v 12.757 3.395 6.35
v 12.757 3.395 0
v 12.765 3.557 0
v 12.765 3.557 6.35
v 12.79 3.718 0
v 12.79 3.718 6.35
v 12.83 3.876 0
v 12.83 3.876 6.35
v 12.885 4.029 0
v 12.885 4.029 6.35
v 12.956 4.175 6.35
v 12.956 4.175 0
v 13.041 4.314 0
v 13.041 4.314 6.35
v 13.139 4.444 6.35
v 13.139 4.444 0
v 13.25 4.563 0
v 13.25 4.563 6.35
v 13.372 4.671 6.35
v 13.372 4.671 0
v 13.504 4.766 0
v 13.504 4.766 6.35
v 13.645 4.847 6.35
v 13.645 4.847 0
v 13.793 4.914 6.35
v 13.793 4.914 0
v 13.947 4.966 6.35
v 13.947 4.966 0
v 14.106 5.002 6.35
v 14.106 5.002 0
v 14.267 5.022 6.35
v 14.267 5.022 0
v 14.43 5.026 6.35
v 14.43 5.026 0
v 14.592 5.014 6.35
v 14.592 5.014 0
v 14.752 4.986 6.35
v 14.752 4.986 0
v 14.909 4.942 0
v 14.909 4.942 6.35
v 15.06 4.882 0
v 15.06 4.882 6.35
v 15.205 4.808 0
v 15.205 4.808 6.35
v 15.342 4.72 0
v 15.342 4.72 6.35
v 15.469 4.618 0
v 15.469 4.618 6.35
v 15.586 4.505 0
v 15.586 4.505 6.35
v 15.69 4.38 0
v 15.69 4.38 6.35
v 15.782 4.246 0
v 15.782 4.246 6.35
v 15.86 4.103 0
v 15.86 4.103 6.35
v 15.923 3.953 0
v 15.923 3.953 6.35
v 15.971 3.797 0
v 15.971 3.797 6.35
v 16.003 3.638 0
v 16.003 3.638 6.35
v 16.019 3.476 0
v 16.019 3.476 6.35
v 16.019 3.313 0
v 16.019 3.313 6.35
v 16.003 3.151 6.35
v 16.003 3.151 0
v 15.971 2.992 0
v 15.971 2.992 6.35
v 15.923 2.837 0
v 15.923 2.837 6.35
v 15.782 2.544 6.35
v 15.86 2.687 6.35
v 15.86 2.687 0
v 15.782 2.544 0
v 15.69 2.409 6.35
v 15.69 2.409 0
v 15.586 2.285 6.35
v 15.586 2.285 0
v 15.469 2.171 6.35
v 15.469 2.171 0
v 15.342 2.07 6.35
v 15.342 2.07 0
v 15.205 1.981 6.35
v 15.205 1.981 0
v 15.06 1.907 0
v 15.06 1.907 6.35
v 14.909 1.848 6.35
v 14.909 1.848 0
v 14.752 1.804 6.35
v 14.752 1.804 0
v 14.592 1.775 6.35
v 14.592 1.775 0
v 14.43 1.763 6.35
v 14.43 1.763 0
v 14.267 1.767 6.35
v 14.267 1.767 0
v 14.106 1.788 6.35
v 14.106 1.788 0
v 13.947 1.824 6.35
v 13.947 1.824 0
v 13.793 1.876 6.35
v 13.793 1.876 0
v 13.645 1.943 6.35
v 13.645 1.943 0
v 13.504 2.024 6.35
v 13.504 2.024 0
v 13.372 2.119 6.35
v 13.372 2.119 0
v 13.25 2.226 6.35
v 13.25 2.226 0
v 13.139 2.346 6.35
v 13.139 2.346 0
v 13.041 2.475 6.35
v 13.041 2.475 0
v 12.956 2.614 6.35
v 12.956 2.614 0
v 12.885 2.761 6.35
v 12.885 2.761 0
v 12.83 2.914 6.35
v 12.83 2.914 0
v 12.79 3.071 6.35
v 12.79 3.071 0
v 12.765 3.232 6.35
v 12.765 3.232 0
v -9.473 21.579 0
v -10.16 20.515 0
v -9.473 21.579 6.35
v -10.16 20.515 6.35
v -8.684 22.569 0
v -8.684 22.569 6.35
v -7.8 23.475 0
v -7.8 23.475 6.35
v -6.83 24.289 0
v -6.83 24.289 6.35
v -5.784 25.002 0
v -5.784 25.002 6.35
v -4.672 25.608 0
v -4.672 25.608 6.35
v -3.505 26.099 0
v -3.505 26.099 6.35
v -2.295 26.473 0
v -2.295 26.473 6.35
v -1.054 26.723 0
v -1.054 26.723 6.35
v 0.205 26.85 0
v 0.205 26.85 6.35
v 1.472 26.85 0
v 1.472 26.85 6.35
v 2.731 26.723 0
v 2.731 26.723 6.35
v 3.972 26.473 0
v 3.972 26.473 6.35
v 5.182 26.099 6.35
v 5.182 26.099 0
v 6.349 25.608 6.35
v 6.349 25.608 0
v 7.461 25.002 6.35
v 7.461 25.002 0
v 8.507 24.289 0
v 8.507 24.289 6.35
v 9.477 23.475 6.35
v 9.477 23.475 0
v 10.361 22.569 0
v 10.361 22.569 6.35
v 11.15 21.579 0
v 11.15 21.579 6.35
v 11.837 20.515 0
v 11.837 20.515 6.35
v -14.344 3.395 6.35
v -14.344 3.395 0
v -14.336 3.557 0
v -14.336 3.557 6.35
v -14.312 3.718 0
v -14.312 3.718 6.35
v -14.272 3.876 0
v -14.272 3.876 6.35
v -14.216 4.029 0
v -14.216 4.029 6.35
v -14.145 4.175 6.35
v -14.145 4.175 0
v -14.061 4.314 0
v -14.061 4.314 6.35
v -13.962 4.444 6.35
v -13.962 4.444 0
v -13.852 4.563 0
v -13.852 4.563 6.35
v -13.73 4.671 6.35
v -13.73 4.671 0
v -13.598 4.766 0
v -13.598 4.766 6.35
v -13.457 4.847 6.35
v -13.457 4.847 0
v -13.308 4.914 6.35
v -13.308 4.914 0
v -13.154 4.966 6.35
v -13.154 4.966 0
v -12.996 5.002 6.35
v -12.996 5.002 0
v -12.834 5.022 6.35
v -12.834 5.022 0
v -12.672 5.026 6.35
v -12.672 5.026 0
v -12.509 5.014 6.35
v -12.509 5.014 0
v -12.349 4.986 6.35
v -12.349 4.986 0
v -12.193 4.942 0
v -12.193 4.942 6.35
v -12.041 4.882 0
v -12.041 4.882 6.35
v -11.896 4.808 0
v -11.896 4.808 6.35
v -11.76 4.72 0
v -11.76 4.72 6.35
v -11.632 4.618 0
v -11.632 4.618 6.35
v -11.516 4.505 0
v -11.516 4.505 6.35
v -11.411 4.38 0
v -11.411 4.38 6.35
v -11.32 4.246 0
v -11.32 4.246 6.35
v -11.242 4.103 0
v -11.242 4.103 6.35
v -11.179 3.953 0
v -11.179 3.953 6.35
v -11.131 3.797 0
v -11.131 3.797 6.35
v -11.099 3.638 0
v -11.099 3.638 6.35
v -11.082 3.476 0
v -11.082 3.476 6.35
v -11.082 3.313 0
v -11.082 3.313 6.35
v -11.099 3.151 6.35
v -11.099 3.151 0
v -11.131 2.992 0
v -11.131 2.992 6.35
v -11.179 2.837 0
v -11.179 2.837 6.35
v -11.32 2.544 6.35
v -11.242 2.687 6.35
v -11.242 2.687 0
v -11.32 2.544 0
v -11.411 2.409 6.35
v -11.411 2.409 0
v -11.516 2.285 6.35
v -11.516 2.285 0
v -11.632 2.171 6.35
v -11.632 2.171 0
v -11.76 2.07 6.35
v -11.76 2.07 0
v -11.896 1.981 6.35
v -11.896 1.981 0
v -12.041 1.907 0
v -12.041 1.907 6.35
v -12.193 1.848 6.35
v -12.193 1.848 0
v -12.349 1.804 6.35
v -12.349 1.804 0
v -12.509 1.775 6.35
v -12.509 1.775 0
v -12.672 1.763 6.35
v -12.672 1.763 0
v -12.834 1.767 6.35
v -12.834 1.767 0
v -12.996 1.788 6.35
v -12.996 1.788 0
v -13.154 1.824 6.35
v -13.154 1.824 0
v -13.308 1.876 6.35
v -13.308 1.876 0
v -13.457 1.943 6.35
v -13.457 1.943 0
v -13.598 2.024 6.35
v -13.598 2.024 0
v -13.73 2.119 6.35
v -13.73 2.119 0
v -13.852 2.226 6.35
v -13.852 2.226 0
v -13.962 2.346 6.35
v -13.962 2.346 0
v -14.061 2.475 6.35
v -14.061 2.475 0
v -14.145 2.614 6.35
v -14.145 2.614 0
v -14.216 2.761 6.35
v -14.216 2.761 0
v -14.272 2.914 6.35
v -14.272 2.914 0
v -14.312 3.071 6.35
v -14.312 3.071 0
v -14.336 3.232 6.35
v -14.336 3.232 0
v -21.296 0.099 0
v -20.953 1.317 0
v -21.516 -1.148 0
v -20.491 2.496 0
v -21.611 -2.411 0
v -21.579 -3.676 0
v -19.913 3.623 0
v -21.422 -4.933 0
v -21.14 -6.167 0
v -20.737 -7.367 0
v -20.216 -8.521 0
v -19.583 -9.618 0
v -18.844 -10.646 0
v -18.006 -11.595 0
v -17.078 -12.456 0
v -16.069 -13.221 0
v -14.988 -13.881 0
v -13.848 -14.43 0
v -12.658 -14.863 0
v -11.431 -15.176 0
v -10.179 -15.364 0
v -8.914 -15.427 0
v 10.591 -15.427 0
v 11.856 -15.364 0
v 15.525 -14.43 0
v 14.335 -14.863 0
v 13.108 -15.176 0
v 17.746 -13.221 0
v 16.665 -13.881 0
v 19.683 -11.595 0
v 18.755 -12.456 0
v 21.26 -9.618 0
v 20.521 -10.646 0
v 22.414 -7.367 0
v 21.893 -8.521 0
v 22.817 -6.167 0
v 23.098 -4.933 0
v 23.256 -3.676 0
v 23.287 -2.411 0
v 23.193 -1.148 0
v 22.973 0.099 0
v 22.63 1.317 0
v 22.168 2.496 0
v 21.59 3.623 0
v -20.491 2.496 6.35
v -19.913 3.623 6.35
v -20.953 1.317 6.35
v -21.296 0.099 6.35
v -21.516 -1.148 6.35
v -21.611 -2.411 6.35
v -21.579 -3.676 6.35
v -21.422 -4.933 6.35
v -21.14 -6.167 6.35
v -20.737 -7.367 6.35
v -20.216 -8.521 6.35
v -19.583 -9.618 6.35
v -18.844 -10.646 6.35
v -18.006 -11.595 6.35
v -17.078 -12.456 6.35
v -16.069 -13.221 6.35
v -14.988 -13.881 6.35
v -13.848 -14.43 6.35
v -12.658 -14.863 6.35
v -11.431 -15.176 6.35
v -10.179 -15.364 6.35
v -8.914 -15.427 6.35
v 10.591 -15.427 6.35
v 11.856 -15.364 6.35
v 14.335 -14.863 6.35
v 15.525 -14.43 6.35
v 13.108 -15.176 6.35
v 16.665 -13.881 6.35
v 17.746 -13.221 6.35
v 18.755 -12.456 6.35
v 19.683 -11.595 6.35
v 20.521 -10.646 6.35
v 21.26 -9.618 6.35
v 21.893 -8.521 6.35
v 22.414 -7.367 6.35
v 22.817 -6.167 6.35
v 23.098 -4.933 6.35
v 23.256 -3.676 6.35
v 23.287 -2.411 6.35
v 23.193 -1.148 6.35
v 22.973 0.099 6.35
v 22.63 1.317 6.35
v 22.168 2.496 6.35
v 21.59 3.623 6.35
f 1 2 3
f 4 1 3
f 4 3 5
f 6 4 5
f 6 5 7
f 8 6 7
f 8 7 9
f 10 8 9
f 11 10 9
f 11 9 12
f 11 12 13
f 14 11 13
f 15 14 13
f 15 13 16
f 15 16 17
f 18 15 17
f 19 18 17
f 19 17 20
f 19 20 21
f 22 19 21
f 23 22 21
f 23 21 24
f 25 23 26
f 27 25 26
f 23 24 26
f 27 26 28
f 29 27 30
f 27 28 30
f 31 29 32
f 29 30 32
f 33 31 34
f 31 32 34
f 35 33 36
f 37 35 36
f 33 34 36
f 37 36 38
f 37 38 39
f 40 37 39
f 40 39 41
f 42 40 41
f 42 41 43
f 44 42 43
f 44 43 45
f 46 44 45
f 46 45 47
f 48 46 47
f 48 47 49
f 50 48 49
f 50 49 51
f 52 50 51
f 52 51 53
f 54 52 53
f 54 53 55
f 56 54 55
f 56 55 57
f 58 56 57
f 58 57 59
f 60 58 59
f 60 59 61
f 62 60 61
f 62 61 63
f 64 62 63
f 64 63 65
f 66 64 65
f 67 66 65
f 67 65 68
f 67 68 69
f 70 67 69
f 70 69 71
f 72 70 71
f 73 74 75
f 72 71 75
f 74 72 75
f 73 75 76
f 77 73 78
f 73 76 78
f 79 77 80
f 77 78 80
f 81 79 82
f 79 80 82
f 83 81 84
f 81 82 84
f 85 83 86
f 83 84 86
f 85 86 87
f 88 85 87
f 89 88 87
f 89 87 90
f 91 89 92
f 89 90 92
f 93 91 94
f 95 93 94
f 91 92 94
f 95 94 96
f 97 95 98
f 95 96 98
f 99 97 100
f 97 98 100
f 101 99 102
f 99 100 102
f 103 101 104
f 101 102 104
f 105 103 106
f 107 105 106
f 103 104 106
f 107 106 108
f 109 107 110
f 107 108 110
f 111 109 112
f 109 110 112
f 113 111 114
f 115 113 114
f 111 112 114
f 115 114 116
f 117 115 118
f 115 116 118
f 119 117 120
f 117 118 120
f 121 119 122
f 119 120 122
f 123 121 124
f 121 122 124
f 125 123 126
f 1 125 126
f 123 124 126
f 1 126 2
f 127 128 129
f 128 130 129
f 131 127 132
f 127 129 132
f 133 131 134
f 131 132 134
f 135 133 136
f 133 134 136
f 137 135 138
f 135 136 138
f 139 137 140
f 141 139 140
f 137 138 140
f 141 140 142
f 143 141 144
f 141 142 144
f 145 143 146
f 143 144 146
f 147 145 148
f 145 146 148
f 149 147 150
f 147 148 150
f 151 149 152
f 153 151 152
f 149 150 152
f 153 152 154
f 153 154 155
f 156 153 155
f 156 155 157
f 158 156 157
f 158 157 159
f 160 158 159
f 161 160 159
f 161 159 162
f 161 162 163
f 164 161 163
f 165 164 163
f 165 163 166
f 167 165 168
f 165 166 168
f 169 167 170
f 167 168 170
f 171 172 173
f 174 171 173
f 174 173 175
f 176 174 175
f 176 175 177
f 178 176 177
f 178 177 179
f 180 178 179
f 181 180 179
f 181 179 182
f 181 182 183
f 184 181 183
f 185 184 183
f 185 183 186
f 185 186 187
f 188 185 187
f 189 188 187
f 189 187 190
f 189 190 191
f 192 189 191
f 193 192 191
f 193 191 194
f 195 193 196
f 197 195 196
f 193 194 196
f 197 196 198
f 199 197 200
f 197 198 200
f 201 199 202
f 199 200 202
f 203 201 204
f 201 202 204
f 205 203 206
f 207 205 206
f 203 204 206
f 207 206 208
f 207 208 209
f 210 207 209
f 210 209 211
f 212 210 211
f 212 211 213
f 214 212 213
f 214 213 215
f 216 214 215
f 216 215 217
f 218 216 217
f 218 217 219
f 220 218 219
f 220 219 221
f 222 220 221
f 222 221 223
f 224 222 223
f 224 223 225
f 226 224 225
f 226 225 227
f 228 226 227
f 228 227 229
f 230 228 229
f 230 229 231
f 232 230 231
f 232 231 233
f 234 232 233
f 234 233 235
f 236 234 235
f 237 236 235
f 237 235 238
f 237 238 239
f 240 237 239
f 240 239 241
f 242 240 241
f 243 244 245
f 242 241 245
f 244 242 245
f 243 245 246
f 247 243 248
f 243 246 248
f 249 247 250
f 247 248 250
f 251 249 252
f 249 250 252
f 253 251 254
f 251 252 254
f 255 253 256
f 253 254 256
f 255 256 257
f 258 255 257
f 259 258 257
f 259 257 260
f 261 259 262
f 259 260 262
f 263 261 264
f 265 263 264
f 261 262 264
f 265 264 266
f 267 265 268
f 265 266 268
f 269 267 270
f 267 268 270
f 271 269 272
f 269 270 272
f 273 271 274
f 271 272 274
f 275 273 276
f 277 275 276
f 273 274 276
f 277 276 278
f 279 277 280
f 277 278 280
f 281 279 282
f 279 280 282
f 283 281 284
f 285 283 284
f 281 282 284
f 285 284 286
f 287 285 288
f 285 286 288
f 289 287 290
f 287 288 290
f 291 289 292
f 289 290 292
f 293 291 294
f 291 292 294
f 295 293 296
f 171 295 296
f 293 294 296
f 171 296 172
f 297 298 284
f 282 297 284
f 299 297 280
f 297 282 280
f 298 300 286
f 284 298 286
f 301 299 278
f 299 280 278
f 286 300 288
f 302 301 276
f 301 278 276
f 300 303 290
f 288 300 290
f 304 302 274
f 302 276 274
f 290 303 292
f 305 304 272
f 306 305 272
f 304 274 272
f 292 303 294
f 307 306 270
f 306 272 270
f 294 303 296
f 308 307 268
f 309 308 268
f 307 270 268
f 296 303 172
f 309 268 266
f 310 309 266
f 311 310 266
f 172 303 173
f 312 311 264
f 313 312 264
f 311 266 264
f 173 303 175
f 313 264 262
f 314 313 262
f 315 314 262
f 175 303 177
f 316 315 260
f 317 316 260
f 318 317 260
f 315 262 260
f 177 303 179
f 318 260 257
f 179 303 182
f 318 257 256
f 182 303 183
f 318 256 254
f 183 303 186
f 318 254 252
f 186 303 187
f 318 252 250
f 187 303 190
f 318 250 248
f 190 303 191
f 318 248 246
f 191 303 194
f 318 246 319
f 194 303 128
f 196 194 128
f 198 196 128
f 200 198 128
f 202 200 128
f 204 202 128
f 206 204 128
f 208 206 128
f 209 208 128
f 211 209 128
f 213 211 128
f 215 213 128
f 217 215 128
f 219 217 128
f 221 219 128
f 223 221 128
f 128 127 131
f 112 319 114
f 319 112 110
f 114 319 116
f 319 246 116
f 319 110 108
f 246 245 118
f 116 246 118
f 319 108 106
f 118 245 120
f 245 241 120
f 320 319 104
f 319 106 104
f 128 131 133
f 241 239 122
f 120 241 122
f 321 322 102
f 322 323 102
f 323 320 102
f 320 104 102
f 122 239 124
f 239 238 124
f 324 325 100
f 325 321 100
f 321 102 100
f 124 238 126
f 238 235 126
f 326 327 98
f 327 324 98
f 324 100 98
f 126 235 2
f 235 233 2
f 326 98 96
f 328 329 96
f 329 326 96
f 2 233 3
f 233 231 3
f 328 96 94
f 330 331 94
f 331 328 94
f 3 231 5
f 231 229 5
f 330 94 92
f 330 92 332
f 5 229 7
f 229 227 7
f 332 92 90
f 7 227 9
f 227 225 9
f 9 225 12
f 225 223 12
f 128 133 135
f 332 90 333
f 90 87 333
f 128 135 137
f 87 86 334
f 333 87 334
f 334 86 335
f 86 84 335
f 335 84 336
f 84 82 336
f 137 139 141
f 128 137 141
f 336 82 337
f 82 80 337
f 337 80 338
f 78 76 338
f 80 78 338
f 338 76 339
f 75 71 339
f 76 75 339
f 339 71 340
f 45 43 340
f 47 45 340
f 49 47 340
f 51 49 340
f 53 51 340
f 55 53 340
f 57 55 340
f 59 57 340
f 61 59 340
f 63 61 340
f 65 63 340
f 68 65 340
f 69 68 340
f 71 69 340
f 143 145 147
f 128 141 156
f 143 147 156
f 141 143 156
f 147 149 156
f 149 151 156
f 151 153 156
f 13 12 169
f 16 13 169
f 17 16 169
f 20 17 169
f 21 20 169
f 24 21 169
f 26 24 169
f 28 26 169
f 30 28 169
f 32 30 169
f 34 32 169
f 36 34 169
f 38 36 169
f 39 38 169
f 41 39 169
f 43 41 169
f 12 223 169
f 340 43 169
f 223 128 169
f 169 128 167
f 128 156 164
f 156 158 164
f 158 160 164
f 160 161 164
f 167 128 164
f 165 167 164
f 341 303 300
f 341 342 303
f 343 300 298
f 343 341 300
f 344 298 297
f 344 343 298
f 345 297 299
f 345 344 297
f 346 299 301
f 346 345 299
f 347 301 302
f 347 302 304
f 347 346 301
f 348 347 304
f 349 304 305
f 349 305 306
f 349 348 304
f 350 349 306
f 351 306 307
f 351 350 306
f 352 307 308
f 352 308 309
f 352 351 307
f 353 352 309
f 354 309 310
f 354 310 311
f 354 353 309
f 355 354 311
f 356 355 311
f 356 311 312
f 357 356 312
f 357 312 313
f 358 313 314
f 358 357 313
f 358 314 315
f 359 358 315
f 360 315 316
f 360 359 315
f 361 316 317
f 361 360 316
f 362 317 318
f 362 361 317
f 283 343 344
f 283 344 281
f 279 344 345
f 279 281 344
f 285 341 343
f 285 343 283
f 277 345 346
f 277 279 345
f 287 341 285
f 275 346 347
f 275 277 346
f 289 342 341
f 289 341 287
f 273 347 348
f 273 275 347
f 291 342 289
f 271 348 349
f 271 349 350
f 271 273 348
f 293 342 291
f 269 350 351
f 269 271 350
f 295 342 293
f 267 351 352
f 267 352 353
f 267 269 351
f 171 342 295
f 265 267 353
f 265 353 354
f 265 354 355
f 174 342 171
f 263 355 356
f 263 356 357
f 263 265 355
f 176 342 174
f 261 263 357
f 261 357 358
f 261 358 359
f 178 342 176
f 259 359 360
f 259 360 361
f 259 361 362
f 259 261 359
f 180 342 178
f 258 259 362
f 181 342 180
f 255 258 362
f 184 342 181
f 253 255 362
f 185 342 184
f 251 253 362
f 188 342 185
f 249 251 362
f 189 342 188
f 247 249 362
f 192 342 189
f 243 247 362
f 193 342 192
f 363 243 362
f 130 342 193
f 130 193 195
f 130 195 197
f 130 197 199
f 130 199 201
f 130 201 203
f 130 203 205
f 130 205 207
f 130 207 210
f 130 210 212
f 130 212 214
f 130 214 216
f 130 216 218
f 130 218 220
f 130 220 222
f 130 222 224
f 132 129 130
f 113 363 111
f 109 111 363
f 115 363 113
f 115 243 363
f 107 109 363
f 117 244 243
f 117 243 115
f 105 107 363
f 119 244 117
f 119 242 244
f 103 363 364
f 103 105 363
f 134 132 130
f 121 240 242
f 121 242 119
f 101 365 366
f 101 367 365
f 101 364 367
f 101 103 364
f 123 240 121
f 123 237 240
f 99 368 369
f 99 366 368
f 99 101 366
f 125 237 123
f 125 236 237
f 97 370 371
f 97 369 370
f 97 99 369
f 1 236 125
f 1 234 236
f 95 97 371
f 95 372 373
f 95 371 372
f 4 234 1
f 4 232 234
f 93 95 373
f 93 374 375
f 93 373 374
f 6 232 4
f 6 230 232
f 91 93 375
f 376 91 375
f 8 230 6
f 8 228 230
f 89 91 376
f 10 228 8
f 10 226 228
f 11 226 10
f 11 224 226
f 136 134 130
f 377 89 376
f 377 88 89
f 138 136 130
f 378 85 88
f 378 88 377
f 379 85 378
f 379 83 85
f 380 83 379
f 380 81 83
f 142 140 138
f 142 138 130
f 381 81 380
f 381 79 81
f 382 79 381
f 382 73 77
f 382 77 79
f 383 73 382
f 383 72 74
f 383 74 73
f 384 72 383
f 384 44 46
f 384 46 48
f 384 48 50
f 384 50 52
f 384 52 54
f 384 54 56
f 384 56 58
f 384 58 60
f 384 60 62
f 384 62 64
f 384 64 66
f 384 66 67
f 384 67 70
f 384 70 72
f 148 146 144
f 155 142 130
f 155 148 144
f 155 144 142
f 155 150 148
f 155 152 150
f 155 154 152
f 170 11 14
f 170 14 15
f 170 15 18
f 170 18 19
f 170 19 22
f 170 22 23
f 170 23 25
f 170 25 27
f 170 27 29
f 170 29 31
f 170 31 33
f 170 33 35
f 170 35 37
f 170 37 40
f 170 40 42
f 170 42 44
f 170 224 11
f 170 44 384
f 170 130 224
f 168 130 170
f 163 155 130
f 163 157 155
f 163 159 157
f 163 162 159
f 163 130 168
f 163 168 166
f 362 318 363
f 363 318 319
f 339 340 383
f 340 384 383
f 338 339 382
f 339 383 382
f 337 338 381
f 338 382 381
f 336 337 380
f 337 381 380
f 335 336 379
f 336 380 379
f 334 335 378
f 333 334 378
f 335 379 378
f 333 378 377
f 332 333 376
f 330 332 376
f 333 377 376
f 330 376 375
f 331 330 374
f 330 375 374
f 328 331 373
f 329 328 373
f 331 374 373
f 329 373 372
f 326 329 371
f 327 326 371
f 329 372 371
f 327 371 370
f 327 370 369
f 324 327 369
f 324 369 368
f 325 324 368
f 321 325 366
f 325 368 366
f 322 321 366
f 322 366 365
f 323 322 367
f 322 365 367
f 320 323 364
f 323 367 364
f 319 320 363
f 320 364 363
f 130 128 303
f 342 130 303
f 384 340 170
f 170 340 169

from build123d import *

# Parameters (mm, degrees)
BOSS_EXTRUDE1_DEPTH       = 6.35
F_4_CLEARANCE_HOLE1_D     = 3.2639
F_4_CLEARANCE_HOLE1_DEPTH = 9.652
F_4_CLEARANCE_HOLE1_TIP   = 0.980574487
FILLET1_R                 = 12.7


with BuildPart() as part:
    # Sketch1 → Boss-Extrude1 (new body)
    with BuildSketch(Plane.XY):
        Polygon((0.838479943, 39.56529588), (-30.911520057, -15.42731726), (32.588479943, -15.42731726), align=None)
    extrude(amount=BOSS_EXTRUDE1_DEPTH)

    # #4 Clearance Hole1
    with Locations(Plane(origin=(-12.712258743, 3.394727996, 6.35), x_dir=(1, 0, 0), z_dir=(0, 0, 1))):
        with Locations((0, 0), (27.101477372, 0)):
            Hole(F_4_CLEARANCE_HOLE1_D / 2, depth=F_4_CLEARANCE_HOLE1_DEPTH)
            with Locations((0, 0, -(F_4_CLEARANCE_HOLE1_DEPTH + F_4_CLEARANCE_HOLE1_TIP / 2))):  # 118° drill point
                Cone(0, F_4_CLEARANCE_HOLE1_D / 2, F_4_CLEARANCE_HOLE1_TIP, mode=Mode.SUBTRACT)

    # Fillet1
    fillet1_edges = [part.edges().sort_by_distance(p)[0] for p in [
        (32.588479943, -15.42731726, 3.175),
        (-30.911520057, -15.42731726, 3.175),
        (0.838479943, 39.56529588, 3.175),
    ]]
    fillet(fillet1_edges, radius=FILLET1_R)


solid = part.part
